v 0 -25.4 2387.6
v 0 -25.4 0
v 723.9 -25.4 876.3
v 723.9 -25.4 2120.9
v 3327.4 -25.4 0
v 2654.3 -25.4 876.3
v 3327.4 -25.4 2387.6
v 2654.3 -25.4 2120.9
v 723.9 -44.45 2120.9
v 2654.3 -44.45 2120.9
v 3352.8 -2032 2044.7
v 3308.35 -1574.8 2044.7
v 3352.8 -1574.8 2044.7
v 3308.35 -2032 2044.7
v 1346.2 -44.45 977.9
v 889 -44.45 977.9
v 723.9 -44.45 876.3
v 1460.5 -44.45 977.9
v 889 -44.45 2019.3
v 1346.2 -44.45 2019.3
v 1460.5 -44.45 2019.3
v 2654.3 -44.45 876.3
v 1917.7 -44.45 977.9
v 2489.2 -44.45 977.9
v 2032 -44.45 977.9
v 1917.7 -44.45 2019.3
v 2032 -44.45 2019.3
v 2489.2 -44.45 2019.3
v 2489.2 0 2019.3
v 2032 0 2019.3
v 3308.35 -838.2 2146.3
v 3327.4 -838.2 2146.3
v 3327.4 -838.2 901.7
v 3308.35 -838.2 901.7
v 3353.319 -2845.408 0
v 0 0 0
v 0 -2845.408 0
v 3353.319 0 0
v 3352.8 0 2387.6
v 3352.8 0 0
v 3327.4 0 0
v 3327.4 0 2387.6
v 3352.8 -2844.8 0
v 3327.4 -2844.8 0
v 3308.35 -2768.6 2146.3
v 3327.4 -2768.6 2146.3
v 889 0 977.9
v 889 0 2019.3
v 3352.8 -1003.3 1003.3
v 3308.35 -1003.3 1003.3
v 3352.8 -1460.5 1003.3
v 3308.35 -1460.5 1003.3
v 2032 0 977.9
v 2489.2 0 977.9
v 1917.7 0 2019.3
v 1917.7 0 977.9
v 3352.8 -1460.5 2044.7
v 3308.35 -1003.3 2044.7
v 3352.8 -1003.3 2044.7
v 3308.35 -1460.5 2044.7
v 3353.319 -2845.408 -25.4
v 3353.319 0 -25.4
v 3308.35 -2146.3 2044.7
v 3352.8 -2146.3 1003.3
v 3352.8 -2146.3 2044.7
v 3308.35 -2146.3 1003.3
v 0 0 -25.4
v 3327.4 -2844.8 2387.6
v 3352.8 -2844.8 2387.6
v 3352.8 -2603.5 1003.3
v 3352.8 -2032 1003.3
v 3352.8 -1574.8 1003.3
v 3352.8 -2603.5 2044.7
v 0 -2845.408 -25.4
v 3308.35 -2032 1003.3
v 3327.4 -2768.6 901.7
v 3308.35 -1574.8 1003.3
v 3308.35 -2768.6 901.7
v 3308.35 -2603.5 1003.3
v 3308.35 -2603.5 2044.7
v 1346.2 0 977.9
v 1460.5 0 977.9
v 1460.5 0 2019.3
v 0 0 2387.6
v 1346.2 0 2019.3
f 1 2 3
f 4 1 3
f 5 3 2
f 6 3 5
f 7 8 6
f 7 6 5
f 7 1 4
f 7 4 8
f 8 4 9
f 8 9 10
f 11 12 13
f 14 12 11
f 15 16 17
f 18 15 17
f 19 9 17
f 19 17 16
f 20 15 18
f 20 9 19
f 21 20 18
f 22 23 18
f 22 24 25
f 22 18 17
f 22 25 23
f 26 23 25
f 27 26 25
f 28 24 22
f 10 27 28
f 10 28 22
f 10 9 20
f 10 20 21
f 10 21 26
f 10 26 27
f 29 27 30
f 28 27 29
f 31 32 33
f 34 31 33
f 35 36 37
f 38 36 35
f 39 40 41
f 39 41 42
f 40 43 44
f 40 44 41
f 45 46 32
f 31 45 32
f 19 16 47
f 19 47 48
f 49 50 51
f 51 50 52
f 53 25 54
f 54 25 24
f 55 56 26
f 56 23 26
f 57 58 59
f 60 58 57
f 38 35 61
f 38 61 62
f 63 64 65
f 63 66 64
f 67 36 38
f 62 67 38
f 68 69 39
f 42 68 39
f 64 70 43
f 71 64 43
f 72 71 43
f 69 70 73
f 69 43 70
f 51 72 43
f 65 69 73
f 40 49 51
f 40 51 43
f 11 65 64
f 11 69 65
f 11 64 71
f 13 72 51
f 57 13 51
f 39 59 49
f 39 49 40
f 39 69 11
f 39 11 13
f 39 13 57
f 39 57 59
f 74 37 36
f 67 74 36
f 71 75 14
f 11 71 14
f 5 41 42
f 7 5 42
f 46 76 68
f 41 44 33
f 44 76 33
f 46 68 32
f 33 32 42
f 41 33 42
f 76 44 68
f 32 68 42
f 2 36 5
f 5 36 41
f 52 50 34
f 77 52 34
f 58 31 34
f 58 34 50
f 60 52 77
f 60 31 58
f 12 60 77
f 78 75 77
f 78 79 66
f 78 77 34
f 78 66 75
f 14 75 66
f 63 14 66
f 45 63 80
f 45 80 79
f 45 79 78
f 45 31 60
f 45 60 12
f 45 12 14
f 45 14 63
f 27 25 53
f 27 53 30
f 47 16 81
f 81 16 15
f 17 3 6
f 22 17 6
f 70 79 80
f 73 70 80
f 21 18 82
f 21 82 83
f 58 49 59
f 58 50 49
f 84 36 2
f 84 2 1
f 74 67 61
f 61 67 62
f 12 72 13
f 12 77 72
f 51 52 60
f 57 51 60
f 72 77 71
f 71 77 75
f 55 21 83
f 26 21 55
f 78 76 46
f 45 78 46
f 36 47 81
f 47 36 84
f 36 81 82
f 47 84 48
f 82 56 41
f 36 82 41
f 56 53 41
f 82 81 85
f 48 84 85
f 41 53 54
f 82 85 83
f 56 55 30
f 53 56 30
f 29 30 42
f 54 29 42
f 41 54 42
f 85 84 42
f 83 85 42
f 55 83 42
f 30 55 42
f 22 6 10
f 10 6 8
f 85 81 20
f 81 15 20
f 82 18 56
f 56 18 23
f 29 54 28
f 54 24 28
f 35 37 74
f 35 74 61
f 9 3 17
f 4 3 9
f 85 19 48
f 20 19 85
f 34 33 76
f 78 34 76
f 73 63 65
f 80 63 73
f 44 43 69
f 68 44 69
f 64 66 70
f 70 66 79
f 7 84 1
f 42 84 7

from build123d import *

# Parameters (mm, degrees)
F0_W      = 3327.4
F0_H      = 2387.6
F1_DEPTH  = 25.4
F2_W      = 1930.4
F2_H      = 1244.6
F2_W_2    = 457.2
F2_H_2    = 1041.4
F3_DEPTH  = 19.05
F4_DEPTH  = 25.4
F6_W      = 2844.8
F6_H      = 2387.6
F7_DEPTH  = 25.4
F8_W      = 457.2
F8_H      = 1041.4
F9_DEPTH  = 19.05
F10_DEPTH = 25.4
F11_W     = 3353.3191680908
F11_H     = 2845.4077243805
F12_DEPTH = 25.4


with BuildPart() as f1:
    # F0 (on Front) → F1 (new body)
    with BuildSketch(Plane.XZ):
        with Locations((1663.7, 1193.8)):
            Rectangle(F0_W, F0_H)
    extrude(amount=F1_DEPTH)

    # F2 (on face) → F3 (join)
    with BuildSketch(Plane.XZ.offset(25.4)):
        with Locations((1689.1, 1498.6)):
            Rectangle(F2_W, F2_H)
        with Locations((1117.6, 1498.6)):
            Rectangle(F2_W_2, F2_H_2, mode=Mode.SUBTRACT)
        with Locations((1689.1, 1498.6)):
            Rectangle(F2_W_2, F2_H_2, mode=Mode.SUBTRACT)
        with Locations((2260.6, 1498.6)):
            Rectangle(F2_W_2, F2_H_2, mode=Mode.SUBTRACT)
    extrude(amount=F3_DEPTH)

    # F4 (cut): faces of the model
    f4_faces = [f1.faces().sort_by_distance(p)[0] for p in [
        (1117.6, -25.4, 1498.6),
        (1689.1, -25.4, 1498.6),
        (2260.6, -25.4, 1498.6),
    ]]
    extrude(f4_faces, amount=-F4_DEPTH, mode=Mode.SUBTRACT)


with BuildPart() as f7:
    # F6 (on offset) → F7 (new body)
    with BuildSketch(Plane.YZ.offset(3352.8)):
        with Locations((-1422.4, 1193.8)):
            Rectangle(F6_W, F6_H)
    extrude(amount=-F7_DEPTH)

    # F8 (on face) → F9 (join)
    with BuildSketch(Plane(origin=(3327.4, 0, 0), x_dir=(0, -1, 0), z_dir=(-1, 0, 0))):
        Polygon((2768.6, 2146.3), (838.2, 2146.3), (838.2, 901.7), (1409.7, 901.7), (1981.2, 901.7), (2768.6, 901.7), align=None)
        with Locations((1231.9, 1524)):
            Rectangle(F8_W, F8_H, mode=Mode.SUBTRACT)
        with Locations((1803.4, 1524)):
            Rectangle(F8_W, F8_H, mode=Mode.SUBTRACT)
        with Locations((2374.9, 1524)):
            Rectangle(F8_W, F8_H, mode=Mode.SUBTRACT)
    extrude(amount=F9_DEPTH)

    # F10 (cut): faces of the model
    f10_faces = [f7.faces().sort_by_distance(p)[0] for p in [
        (3327.4, -1231.9, 1524),
        (3327.4, -1803.4, 1524),
        (3327.4, -2374.9, 1524),
    ]]
    extrude(f10_faces, amount=-F10_DEPTH, mode=Mode.SUBTRACT)


with BuildPart() as f12:
    # F11 (on Top) → F12 (new body)
    with BuildSketch(Plane.XY):
        with Locations((1676.6595840454, -1422.7038621902)):
            Rectangle(F11_W, F11_H)
    extrude(amount=-F12_DEPTH)


solid = Compound([f1.part, f7.part, f12.part])
